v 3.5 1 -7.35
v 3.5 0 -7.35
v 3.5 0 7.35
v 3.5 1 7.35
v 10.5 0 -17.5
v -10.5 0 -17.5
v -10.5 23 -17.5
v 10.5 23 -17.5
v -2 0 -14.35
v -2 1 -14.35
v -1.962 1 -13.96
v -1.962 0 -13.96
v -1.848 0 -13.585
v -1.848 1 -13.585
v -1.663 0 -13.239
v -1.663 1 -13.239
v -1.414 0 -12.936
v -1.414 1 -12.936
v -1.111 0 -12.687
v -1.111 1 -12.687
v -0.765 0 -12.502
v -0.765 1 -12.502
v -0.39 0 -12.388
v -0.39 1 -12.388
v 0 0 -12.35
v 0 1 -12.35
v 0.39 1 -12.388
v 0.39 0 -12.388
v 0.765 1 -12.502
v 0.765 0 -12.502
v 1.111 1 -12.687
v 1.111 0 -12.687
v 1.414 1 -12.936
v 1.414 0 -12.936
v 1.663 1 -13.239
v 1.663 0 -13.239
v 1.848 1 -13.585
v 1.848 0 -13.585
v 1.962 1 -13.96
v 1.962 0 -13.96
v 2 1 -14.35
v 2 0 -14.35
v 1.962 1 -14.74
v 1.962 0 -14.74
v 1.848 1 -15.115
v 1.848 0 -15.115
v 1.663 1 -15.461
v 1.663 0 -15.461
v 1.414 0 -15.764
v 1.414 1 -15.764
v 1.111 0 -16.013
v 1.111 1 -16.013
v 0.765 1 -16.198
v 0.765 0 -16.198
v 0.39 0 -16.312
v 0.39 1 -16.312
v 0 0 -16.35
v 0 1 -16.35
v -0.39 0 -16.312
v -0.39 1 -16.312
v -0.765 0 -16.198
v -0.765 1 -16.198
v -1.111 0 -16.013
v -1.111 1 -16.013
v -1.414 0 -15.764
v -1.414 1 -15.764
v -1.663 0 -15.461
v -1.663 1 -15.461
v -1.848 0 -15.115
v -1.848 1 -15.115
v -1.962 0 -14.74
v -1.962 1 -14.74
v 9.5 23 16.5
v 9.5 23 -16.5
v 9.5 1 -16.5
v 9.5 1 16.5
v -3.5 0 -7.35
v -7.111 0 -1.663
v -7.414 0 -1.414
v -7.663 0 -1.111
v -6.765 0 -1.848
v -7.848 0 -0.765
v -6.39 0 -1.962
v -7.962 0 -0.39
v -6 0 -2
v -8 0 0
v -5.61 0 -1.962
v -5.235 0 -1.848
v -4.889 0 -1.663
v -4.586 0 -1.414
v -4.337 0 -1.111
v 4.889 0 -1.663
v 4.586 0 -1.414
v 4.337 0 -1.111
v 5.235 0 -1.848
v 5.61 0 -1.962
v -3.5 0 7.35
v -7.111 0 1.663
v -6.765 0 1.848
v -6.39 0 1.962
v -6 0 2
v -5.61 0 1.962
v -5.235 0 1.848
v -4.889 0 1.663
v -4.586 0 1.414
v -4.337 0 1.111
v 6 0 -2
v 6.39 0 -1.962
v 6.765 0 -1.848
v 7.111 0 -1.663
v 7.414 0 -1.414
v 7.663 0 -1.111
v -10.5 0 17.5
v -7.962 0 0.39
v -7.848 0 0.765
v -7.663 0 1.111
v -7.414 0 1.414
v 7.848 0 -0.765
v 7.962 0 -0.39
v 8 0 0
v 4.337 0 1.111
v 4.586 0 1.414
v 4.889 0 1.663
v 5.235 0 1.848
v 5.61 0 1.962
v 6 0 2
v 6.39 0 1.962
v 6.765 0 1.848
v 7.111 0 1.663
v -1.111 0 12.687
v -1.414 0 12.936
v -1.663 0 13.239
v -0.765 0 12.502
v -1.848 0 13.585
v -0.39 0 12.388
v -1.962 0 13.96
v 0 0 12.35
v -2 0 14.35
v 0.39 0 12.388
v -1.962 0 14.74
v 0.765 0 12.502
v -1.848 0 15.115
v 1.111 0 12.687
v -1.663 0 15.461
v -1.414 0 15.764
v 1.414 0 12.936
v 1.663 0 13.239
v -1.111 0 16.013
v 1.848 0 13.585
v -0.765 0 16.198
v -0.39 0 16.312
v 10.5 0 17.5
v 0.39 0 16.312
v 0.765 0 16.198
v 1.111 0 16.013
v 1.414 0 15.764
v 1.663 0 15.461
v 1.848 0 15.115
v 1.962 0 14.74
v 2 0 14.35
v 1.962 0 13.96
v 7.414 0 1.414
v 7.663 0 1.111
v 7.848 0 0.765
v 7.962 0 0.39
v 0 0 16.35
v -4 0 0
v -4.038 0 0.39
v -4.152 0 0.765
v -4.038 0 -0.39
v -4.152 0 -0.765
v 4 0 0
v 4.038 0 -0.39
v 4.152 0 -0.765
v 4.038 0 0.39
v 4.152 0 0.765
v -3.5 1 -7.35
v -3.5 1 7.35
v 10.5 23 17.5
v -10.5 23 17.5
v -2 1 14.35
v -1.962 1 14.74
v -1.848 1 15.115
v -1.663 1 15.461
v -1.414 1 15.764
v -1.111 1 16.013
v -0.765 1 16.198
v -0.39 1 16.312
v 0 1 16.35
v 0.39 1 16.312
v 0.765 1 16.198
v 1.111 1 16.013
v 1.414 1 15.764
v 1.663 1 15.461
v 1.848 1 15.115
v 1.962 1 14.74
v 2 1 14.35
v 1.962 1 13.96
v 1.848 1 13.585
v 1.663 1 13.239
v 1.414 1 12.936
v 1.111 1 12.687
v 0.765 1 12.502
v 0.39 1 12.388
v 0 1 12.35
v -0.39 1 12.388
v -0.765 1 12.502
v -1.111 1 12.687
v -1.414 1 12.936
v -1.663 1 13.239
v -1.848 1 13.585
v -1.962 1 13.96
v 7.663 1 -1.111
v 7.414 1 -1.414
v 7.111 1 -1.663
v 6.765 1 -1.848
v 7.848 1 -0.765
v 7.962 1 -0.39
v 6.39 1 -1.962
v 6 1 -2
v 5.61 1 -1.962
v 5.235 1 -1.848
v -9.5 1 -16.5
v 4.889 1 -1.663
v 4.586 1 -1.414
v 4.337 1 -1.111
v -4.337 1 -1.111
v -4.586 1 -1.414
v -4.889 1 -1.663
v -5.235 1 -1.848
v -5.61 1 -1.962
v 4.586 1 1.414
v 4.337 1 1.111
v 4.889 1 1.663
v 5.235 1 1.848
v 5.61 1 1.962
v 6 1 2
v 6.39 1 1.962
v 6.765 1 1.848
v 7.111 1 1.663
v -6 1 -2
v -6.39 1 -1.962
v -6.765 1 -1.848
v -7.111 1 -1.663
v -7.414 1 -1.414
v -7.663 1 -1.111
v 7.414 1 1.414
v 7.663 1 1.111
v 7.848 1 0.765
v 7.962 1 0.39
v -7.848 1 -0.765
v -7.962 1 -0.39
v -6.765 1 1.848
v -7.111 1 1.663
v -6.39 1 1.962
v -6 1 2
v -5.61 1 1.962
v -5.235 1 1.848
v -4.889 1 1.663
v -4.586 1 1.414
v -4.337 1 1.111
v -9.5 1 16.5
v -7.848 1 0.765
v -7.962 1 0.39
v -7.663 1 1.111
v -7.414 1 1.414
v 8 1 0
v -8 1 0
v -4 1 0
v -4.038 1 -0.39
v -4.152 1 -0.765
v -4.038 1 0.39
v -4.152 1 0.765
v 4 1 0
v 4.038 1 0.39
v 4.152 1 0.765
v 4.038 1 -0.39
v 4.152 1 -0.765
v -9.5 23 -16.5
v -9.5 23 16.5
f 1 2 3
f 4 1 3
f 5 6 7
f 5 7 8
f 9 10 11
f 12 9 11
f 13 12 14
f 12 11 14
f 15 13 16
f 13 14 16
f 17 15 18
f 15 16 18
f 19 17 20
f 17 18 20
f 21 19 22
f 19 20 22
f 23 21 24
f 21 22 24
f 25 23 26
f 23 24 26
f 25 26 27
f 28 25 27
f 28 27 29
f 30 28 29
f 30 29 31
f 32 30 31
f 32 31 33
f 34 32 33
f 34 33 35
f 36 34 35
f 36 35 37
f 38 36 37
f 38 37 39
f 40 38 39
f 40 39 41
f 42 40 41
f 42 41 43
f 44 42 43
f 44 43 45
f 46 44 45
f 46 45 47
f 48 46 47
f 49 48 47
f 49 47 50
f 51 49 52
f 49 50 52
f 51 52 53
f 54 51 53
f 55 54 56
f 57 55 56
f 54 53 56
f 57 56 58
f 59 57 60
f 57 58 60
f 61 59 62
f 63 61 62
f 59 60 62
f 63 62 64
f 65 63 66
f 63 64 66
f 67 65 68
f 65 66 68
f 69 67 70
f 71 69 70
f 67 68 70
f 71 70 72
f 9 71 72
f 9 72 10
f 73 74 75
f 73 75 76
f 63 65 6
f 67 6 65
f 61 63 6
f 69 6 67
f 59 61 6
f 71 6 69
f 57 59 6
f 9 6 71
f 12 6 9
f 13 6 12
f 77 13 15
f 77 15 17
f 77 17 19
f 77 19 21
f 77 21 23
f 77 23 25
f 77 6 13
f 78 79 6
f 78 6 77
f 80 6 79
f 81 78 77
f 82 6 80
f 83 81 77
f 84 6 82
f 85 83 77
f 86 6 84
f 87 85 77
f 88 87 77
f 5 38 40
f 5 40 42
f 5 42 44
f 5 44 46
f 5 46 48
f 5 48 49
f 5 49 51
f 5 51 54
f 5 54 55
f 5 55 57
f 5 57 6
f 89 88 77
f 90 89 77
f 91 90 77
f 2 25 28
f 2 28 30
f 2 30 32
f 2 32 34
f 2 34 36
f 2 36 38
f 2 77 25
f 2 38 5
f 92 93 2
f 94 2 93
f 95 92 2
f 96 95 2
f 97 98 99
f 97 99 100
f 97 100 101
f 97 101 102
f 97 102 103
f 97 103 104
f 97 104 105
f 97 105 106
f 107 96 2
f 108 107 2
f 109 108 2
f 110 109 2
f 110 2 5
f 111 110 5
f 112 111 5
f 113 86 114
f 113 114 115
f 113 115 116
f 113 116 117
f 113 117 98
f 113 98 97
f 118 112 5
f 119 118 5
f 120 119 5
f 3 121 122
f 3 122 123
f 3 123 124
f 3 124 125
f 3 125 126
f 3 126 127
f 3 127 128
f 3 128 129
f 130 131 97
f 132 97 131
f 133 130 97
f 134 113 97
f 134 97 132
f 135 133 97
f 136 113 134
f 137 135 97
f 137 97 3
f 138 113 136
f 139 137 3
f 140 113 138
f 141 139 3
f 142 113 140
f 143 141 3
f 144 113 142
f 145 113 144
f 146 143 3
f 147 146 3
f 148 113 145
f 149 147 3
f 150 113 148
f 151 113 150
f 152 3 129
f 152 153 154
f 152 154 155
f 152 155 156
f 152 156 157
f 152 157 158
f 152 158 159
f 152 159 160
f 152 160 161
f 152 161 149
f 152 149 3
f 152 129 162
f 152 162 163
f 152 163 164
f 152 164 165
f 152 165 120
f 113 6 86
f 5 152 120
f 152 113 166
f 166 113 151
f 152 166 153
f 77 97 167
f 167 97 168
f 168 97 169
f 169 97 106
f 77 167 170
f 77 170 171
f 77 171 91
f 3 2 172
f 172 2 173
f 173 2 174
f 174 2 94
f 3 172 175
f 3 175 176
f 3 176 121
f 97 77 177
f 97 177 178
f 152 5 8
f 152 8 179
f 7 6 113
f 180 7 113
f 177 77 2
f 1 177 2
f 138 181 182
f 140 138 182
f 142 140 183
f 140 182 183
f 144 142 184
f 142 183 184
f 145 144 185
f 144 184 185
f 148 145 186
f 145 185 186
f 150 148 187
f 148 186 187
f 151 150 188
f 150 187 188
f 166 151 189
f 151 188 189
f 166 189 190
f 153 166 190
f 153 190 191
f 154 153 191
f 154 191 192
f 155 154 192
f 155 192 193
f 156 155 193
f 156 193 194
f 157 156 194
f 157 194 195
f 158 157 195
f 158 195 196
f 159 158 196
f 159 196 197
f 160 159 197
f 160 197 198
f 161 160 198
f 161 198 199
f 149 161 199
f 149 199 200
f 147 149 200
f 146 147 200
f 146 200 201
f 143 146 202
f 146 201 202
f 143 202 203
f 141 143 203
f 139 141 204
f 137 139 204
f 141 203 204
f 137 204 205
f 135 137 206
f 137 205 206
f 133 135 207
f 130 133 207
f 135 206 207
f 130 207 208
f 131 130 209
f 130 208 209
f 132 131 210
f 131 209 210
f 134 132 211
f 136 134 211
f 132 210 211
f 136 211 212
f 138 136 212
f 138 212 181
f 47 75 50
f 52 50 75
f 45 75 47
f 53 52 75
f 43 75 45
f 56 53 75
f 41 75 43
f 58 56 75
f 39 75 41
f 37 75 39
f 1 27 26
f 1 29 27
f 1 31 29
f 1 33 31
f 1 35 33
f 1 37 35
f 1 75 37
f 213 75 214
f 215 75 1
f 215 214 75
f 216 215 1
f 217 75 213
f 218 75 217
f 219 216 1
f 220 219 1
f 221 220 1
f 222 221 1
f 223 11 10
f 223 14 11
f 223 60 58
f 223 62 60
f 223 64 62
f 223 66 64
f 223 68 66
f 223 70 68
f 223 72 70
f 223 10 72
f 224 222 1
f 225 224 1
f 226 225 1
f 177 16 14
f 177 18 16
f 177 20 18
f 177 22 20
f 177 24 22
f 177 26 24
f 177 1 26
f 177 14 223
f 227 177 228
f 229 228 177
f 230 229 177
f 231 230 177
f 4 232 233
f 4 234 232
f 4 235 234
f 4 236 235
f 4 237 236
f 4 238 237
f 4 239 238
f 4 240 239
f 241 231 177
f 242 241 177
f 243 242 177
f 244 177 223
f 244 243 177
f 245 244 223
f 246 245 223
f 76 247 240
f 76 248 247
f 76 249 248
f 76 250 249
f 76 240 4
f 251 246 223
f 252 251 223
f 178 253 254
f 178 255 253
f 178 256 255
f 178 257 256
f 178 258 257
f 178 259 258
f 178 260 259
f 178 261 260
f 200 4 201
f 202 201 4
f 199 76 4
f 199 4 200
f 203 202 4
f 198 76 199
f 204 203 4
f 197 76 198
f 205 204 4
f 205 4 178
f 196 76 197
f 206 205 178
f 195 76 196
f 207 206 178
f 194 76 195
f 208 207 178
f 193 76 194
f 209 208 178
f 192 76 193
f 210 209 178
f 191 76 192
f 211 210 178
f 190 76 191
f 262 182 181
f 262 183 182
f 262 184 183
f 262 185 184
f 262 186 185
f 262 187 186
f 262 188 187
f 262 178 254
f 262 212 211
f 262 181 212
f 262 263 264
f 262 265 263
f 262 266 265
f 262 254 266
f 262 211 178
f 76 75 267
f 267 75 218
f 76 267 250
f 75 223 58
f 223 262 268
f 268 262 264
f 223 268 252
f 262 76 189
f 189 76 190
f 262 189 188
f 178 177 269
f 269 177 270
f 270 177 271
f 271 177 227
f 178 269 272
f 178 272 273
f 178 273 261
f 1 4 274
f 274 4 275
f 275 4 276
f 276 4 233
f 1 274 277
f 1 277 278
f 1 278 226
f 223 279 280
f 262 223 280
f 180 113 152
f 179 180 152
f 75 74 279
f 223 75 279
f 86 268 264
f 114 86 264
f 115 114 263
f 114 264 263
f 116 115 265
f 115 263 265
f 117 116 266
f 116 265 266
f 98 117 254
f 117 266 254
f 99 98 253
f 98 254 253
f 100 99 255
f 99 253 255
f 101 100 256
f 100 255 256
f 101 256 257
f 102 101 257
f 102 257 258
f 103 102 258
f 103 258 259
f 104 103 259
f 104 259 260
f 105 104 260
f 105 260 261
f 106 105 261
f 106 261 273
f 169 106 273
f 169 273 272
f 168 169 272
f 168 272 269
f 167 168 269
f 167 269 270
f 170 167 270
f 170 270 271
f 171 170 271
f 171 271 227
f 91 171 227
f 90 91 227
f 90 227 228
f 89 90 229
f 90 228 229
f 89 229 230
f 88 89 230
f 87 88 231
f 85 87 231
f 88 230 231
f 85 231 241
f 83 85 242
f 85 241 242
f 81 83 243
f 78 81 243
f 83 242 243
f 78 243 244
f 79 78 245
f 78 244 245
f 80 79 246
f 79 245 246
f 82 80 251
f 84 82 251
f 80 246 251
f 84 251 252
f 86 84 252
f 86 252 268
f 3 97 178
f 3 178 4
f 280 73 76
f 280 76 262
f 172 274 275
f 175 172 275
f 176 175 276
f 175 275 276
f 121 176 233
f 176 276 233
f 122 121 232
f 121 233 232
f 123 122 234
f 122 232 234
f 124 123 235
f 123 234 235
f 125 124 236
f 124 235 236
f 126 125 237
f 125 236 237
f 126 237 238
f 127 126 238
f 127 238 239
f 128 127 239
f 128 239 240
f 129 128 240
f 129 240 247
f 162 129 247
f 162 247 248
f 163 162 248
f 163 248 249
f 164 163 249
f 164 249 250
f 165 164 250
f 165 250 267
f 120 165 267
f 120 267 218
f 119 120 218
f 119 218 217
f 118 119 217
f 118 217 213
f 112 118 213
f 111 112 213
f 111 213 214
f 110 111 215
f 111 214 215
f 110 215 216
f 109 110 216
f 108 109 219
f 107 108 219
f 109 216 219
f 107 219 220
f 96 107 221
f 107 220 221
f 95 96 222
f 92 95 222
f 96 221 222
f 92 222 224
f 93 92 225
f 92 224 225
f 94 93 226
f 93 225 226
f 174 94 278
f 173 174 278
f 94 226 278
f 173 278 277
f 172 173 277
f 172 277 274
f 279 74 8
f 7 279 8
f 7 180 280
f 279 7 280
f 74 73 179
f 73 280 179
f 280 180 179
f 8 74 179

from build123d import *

# Parameters (mm, degrees)
F1_W     = 21
F1_H     = 35
F2_DEPTH = 23
F3_W     = 19
F3_H     = 33
F4_DEPTH = 22
F5_W     = 7
F5_H     = 14.7
F6_DEPTH = 25
F8_D     = 4
F8_DEPTH = 6
F8_TIP   = 1.2017212381


with BuildPart() as f2:
    # F1 (on Front) → F2 (new body)
    with BuildSketch(Plane.XZ):
        Rectangle(F1_W, F1_H)
    extrude(amount=-F2_DEPTH)

    # F3 (on face) → F4 (cut)
    with BuildSketch(Plane(origin=(0, 23, 0), x_dir=(-1, 0, 0), z_dir=(0, 1, 0))):
        Rectangle(F3_W, F3_H)
    extrude(amount=-F4_DEPTH, mode=Mode.SUBTRACT)

    # F5 (on Front) → F6 (cut)
    with BuildSketch(Plane.XZ):
        Rectangle(F5_W, F5_H)
    extrude(amount=-F6_DEPTH, mode=Mode.SUBTRACT)

    # F8
    with Locations(Plane.XZ):
        with Locations((0, 14.35), (-6, 0), (6, 0), (0, -14.35)):
            Hole(F8_D / 2, depth=F8_DEPTH)
            with Locations((0, 0, -(F8_DEPTH + F8_TIP / 2))):  # 118° drill point
                Cone(0, F8_D / 2, F8_TIP, mode=Mode.SUBTRACT)


solid = f2.part
